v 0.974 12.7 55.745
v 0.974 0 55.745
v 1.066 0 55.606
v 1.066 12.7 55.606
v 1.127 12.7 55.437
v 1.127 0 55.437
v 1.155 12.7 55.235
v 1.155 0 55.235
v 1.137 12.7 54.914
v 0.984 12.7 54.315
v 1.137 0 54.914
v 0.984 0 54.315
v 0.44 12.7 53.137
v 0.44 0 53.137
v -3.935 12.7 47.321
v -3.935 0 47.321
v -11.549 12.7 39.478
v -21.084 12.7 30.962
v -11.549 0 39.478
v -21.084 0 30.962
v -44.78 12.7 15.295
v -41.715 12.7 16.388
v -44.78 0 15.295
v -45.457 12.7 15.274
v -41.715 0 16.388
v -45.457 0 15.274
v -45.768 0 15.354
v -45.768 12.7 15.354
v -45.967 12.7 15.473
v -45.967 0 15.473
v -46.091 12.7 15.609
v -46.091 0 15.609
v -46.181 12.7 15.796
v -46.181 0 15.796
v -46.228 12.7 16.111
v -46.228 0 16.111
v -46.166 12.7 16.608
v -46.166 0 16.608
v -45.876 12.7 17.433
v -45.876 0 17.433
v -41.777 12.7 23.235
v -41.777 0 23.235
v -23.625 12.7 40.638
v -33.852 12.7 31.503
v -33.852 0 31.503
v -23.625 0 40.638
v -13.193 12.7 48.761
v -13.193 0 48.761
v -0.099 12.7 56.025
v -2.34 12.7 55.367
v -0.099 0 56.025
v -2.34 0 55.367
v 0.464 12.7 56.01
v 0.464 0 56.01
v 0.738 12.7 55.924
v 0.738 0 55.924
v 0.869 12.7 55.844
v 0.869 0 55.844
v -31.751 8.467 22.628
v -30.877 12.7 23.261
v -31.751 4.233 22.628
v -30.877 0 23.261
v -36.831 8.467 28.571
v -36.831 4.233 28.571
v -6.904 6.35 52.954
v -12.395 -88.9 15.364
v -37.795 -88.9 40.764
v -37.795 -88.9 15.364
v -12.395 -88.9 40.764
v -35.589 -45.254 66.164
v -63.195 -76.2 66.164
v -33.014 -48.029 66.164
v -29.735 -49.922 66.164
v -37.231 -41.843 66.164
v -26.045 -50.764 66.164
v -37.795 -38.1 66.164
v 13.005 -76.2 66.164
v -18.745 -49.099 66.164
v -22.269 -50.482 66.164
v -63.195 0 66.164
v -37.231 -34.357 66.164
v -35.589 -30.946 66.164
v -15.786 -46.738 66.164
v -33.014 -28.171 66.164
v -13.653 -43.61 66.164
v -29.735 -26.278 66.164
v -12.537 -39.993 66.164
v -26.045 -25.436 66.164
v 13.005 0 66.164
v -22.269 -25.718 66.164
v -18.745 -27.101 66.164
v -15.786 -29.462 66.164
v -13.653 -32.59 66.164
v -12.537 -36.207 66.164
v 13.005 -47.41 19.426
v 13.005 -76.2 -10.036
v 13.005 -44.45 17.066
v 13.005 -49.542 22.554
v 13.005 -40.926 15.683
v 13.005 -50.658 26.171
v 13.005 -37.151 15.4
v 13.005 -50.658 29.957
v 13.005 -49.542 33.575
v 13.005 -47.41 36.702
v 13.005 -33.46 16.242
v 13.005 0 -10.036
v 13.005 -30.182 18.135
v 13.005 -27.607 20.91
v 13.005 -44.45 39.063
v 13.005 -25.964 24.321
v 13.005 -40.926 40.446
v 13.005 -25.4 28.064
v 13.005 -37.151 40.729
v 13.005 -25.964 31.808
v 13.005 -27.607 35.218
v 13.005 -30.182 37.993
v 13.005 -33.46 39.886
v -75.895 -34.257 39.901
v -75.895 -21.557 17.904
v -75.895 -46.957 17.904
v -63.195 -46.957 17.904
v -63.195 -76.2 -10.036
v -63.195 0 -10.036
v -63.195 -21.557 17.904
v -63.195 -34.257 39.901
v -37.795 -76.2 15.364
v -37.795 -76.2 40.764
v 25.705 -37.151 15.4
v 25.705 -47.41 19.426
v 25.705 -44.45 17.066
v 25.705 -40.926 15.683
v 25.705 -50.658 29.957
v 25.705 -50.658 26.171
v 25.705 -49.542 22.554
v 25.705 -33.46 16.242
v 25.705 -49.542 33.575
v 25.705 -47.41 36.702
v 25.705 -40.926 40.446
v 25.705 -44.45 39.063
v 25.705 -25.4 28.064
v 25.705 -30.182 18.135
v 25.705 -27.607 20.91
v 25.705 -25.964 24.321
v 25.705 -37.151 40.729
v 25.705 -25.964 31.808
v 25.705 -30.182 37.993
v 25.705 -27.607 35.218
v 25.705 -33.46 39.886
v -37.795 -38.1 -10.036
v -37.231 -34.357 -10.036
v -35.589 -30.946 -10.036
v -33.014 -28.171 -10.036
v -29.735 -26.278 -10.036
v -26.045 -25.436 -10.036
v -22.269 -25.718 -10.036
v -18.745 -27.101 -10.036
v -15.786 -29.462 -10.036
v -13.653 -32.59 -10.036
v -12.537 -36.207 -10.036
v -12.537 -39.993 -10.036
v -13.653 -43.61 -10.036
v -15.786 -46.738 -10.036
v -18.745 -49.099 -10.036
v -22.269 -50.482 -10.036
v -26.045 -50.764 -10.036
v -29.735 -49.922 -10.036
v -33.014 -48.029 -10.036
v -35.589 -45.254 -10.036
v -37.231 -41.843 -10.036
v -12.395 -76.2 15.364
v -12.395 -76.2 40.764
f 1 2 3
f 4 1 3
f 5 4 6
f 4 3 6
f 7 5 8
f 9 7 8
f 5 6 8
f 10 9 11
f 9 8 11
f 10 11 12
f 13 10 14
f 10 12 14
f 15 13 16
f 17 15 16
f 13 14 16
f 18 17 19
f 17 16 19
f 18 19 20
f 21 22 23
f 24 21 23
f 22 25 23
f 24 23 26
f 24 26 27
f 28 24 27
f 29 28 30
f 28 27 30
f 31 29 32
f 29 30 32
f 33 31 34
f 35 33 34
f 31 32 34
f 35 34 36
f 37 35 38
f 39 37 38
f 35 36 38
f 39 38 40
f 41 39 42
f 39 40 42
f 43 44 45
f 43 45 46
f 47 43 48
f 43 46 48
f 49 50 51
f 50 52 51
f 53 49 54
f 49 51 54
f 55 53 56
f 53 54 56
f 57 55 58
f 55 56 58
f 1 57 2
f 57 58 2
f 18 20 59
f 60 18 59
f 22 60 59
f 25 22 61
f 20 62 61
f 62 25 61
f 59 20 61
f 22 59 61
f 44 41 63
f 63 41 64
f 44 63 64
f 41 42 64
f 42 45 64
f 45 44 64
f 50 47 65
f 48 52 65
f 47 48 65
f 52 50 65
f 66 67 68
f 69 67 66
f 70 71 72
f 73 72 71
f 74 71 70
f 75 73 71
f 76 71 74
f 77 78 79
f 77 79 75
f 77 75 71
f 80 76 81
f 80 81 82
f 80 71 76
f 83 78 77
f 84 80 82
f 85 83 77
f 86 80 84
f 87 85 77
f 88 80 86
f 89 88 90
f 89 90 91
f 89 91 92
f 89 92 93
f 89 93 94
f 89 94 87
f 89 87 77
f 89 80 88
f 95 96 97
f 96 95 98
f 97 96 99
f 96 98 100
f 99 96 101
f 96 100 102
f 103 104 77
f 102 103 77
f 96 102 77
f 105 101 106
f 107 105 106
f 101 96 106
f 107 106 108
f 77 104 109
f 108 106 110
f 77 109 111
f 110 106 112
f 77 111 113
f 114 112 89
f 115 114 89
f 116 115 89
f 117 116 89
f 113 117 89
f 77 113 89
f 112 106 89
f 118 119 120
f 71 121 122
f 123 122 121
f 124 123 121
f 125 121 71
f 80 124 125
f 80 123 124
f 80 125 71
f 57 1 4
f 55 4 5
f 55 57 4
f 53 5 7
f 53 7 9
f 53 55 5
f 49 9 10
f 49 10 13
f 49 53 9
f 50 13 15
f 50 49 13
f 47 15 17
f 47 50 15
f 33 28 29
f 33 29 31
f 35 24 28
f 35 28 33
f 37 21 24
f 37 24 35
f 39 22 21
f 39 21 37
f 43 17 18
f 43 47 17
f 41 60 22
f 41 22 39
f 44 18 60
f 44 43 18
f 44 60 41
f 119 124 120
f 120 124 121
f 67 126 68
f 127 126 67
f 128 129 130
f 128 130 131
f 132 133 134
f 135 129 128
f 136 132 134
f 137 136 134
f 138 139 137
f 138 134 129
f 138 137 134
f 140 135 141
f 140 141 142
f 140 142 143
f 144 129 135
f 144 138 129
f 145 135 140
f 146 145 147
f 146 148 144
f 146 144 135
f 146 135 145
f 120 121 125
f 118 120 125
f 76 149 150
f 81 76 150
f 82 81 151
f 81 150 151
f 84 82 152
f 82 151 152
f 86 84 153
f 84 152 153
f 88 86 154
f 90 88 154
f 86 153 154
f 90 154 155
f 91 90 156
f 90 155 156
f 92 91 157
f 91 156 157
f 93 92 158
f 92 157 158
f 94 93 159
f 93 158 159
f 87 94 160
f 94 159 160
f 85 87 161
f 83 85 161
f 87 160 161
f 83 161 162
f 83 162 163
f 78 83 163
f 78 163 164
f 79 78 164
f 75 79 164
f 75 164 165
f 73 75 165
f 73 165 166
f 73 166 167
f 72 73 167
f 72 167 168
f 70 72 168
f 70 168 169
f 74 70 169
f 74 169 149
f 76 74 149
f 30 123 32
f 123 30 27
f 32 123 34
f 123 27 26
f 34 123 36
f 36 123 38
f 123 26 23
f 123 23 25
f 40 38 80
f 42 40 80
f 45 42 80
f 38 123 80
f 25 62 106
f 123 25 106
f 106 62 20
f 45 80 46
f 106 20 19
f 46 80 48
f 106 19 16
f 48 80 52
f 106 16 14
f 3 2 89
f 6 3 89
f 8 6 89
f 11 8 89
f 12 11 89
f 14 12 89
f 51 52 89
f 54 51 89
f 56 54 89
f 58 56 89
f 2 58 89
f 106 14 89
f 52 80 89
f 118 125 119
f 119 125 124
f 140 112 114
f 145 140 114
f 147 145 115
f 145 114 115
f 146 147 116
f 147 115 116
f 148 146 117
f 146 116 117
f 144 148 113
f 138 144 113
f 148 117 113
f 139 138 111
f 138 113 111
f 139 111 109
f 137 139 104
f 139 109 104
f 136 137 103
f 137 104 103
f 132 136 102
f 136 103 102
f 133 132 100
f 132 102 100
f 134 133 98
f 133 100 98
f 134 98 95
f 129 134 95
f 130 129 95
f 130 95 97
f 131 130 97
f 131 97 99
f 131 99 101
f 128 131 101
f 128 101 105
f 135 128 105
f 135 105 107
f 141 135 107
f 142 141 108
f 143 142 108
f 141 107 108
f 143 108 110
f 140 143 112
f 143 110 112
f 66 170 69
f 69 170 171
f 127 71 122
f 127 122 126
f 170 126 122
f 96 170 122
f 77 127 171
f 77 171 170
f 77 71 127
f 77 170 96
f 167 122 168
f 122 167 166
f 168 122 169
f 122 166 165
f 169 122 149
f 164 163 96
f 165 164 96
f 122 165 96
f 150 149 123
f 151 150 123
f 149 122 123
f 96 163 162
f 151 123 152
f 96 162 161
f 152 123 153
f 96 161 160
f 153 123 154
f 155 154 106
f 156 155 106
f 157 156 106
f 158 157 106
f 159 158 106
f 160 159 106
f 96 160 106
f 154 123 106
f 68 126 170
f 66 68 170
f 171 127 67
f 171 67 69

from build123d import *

# Parameters (mm, degrees)
F0_W      = 76.2
F0_H      = 76.2
F1_DEPTH  = 76.2
F2_W      = 25.4
F2_H      = 25.4
F3_DEPTH  = 12.7
F4_R      = 12.7
F5_DEPTH  = 12.7
F7_D      = 25.4
F9_DEPTH  = 12.7
F11_DEPTH = 12.7


with BuildPart() as f1:
    # F0 (on Front) → F1 (new body)
    with BuildSketch(Plane.XZ):
        with Locations((-25.095452, 28.064179)):
            Rectangle(F0_W, F0_H)
    extrude(amount=F1_DEPTH)

    # F2 (on face) → F3 (join)
    with BuildSketch(Plane.XZ.offset(76.2)):
        with Locations((-25.095452, 28.064179)):
            Rectangle(F2_W, F2_H)
    extrude(amount=F3_DEPTH)

    # F4 (on face) → F5 (join)
    with BuildSketch(Plane.YZ.offset(13.004548)):
        with Locations((-38.1, 28.064179)):
            Circle(F4_R)
    extrude(amount=F5_DEPTH)

    # F7 (through all)
    with Locations(Plane.XY.offset(66.164179)):
        with Locations((-25.095452, -38.1)):
            Hole(F7_D / 2)

    # F8 (on face) → F9 (join)
    with BuildSketch(Plane(origin=(-63.195452, 0, 0), x_dir=(0, -1, 0), z_dir=(-1, 0, 0))):
        Polygon((46.956852, 17.904179), (34.256852, 39.901224), (21.556852, 17.904179), align=None)
    extrude(amount=F9_DEPTH)

    # F10 (on face) → F11 (join)
    with BuildSketch(Plane(origin=(0, 0, 0), x_dir=(-1, 0, 0), z_dir=(0, 1, 0))):
        with BuildLine():
            add(Edge.make_bspline(
                [(-0.974158, 55.745363), (-6.054851, 49.801911), (31.750569, 22.627692), (69.555988, -4.546527), (36.831261, 28.571144), (4.106534, 61.688816), (-0.974158, 55.745363)],
                knots=[0, 0, 0, 2.094395, 2.094395, 4.18879, 4.18879, 6.283185, 6.283185, 6.283185], degree=2, weights=[1, 0.5, 1, 0.5, 1, 0.5, 1]))
        make_face()
    extrude(amount=F11_DEPTH)


solid = f1.part
